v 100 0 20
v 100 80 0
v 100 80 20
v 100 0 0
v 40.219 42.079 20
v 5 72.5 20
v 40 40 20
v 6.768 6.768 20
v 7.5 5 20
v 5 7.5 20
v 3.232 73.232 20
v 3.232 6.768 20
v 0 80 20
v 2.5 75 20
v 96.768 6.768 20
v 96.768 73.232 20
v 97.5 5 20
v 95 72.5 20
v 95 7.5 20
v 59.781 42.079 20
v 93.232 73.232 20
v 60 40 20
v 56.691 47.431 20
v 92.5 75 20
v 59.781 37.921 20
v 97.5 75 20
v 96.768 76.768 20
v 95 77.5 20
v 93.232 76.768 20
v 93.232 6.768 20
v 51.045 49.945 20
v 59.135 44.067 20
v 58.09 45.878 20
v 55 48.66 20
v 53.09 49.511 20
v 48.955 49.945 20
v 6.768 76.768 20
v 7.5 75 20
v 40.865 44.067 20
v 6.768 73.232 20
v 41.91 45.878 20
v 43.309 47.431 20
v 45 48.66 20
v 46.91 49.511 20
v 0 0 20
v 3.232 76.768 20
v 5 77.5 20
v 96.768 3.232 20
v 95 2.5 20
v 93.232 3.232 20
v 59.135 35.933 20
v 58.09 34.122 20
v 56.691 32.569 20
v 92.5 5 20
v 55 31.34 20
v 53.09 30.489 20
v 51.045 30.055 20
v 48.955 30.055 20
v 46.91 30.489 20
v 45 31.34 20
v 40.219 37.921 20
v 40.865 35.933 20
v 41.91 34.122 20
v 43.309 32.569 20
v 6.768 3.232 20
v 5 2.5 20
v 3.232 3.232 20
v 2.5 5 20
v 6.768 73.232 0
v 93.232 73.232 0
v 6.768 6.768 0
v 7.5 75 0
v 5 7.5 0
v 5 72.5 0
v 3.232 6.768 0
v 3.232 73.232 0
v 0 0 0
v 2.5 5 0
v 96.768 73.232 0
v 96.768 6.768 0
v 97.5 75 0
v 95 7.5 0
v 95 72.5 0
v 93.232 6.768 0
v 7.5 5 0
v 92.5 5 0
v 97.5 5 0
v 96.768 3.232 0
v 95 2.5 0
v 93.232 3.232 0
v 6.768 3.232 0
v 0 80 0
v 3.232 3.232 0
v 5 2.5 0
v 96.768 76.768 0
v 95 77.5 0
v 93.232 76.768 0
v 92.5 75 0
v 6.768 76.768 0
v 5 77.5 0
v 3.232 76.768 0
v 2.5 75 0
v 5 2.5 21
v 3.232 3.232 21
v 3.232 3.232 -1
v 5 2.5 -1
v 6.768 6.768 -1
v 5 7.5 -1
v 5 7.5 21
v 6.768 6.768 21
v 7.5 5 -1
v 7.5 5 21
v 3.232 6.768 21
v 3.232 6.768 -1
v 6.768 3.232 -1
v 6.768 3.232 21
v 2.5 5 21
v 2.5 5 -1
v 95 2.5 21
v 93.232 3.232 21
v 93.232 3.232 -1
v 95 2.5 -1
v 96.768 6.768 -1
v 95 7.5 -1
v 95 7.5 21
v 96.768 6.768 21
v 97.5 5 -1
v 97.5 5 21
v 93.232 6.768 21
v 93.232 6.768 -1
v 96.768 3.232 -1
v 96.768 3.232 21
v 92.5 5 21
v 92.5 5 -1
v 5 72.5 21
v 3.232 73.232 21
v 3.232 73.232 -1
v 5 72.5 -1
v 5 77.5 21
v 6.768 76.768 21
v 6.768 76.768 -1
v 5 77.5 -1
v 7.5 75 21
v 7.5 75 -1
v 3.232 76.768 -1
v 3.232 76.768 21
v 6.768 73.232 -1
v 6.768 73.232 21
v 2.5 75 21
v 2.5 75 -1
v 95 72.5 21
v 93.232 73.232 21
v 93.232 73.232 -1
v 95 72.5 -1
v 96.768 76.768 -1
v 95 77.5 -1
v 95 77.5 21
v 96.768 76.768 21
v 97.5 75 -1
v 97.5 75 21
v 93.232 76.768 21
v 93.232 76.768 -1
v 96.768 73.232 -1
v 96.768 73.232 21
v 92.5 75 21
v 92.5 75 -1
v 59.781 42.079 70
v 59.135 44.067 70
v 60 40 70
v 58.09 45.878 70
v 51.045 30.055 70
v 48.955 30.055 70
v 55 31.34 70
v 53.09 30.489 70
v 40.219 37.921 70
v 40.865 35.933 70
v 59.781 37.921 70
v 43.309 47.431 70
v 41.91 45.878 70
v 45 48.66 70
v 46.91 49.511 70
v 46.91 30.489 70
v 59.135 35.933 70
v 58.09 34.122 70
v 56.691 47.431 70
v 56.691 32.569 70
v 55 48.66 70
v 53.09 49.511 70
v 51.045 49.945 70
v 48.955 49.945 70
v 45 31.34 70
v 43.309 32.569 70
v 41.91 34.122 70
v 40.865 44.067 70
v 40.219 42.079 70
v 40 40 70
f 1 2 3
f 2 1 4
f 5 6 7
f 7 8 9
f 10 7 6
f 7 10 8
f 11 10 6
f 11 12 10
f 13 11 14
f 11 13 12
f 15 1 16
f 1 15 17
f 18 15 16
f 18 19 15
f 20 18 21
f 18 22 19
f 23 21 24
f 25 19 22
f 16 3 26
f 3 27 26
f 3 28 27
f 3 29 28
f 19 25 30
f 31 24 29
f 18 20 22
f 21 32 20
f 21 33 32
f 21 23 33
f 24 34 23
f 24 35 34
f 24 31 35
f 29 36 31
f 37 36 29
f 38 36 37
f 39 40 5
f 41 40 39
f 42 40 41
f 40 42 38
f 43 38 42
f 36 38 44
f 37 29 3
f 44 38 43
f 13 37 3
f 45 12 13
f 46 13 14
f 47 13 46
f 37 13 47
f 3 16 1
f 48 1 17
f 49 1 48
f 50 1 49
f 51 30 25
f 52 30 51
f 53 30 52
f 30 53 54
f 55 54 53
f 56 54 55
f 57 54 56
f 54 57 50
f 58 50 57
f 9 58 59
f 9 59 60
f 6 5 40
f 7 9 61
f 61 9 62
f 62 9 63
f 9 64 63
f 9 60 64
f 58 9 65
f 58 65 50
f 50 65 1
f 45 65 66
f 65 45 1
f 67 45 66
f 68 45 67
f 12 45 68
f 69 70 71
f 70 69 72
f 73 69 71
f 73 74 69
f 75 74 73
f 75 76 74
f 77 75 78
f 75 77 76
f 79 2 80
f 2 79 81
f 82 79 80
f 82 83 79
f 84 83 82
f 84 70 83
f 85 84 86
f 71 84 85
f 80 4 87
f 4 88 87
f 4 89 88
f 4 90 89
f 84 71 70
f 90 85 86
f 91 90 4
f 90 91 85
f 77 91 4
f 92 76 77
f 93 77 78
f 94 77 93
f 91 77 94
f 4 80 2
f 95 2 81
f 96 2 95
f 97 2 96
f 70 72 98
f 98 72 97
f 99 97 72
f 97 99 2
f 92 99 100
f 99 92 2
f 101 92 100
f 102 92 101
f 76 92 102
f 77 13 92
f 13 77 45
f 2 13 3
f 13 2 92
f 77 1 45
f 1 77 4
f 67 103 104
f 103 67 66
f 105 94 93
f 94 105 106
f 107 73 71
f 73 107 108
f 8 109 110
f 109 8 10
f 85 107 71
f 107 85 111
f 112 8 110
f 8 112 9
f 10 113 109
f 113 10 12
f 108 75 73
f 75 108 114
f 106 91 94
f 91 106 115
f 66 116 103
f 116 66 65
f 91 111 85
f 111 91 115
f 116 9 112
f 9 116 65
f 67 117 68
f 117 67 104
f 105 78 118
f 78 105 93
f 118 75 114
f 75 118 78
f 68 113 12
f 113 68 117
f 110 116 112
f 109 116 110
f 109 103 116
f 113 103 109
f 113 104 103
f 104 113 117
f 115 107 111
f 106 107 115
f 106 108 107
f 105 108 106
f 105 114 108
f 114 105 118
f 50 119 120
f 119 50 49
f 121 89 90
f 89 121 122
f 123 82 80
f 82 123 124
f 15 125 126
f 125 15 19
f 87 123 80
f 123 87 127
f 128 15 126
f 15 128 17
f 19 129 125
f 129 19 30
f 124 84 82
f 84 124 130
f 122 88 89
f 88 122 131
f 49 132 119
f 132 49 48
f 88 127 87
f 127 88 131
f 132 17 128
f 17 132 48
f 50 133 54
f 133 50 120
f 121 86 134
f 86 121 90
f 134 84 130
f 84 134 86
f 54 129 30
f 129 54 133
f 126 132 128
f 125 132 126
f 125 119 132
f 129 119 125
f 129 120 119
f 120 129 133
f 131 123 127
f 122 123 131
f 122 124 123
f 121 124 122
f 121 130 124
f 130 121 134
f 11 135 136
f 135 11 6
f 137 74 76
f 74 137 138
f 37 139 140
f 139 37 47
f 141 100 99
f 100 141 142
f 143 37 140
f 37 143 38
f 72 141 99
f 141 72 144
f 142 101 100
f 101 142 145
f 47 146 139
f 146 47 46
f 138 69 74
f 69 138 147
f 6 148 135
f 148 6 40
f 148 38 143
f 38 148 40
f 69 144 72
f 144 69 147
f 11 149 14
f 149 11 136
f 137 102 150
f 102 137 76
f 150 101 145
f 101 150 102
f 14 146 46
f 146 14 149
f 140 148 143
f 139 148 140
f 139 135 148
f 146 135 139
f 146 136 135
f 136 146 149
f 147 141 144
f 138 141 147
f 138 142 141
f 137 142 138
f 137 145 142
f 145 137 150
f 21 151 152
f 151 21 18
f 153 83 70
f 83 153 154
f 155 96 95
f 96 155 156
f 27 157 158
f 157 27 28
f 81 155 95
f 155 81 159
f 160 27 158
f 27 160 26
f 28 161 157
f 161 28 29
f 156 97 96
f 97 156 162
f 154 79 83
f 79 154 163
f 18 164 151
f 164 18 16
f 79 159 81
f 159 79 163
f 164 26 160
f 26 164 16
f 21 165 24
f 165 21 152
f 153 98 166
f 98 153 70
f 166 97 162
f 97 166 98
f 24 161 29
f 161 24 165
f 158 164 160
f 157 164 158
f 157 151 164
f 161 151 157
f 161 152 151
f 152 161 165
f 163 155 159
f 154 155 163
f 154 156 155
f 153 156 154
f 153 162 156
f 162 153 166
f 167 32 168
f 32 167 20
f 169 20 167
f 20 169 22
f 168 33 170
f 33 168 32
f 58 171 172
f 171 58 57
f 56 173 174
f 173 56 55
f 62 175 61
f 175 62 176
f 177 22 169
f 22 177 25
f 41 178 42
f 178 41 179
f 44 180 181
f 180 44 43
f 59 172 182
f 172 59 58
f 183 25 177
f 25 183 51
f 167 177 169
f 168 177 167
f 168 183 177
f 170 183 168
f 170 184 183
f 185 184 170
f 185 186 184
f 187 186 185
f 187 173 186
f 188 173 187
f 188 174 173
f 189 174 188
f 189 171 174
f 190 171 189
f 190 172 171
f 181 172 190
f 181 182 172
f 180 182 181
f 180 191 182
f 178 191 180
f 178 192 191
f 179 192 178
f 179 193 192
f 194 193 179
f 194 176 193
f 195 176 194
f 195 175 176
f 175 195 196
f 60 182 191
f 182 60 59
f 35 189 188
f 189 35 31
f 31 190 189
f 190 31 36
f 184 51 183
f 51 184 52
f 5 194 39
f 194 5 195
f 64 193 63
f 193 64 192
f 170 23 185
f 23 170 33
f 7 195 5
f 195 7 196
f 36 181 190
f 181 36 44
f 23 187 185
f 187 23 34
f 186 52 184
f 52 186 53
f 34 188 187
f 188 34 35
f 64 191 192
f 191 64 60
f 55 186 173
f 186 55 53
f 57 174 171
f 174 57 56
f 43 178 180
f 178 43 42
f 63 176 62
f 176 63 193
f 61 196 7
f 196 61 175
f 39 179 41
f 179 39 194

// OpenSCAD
// Cuboid with holes and a central cylinder

// Dimensions
cuboid_length = 100;
cuboid_width  = 80;
cuboid_height = 20;
hole_diameter = 5;
hole_offset   = 5;
cylinder_diameter = 20;
cylinder_height = 50;

module cuboid_with_features() {
    // Create the cuboid
    cube([cuboid_length, cuboid_width, cuboid_height]);

    // Create holes
    translate([hole_offset, hole_offset, -1])
    cylinder(h = cuboid_height + 2, d = hole_diameter); // Ensure hole goes all the way through

    translate([cuboid_length - hole_offset, hole_offset, -1])
    cylinder(h = cuboid_height + 2, d = hole_diameter);

    translate([hole_offset, cuboid_width - hole_offset, -1])
    cylinder(h = cuboid_height + 2, d = hole_diameter);

    translate([cuboid_length - hole_offset, cuboid_width - hole_offset, -1])
    cylinder(h = cuboid_height + 2, d = hole_diameter);

    // Create the cylinder on top
    translate([cuboid_length/2, cuboid_width/2, cuboid_height])
    cylinder(h = cylinder_height, d = cylinder_diameter);
}

cuboid_with_features();
